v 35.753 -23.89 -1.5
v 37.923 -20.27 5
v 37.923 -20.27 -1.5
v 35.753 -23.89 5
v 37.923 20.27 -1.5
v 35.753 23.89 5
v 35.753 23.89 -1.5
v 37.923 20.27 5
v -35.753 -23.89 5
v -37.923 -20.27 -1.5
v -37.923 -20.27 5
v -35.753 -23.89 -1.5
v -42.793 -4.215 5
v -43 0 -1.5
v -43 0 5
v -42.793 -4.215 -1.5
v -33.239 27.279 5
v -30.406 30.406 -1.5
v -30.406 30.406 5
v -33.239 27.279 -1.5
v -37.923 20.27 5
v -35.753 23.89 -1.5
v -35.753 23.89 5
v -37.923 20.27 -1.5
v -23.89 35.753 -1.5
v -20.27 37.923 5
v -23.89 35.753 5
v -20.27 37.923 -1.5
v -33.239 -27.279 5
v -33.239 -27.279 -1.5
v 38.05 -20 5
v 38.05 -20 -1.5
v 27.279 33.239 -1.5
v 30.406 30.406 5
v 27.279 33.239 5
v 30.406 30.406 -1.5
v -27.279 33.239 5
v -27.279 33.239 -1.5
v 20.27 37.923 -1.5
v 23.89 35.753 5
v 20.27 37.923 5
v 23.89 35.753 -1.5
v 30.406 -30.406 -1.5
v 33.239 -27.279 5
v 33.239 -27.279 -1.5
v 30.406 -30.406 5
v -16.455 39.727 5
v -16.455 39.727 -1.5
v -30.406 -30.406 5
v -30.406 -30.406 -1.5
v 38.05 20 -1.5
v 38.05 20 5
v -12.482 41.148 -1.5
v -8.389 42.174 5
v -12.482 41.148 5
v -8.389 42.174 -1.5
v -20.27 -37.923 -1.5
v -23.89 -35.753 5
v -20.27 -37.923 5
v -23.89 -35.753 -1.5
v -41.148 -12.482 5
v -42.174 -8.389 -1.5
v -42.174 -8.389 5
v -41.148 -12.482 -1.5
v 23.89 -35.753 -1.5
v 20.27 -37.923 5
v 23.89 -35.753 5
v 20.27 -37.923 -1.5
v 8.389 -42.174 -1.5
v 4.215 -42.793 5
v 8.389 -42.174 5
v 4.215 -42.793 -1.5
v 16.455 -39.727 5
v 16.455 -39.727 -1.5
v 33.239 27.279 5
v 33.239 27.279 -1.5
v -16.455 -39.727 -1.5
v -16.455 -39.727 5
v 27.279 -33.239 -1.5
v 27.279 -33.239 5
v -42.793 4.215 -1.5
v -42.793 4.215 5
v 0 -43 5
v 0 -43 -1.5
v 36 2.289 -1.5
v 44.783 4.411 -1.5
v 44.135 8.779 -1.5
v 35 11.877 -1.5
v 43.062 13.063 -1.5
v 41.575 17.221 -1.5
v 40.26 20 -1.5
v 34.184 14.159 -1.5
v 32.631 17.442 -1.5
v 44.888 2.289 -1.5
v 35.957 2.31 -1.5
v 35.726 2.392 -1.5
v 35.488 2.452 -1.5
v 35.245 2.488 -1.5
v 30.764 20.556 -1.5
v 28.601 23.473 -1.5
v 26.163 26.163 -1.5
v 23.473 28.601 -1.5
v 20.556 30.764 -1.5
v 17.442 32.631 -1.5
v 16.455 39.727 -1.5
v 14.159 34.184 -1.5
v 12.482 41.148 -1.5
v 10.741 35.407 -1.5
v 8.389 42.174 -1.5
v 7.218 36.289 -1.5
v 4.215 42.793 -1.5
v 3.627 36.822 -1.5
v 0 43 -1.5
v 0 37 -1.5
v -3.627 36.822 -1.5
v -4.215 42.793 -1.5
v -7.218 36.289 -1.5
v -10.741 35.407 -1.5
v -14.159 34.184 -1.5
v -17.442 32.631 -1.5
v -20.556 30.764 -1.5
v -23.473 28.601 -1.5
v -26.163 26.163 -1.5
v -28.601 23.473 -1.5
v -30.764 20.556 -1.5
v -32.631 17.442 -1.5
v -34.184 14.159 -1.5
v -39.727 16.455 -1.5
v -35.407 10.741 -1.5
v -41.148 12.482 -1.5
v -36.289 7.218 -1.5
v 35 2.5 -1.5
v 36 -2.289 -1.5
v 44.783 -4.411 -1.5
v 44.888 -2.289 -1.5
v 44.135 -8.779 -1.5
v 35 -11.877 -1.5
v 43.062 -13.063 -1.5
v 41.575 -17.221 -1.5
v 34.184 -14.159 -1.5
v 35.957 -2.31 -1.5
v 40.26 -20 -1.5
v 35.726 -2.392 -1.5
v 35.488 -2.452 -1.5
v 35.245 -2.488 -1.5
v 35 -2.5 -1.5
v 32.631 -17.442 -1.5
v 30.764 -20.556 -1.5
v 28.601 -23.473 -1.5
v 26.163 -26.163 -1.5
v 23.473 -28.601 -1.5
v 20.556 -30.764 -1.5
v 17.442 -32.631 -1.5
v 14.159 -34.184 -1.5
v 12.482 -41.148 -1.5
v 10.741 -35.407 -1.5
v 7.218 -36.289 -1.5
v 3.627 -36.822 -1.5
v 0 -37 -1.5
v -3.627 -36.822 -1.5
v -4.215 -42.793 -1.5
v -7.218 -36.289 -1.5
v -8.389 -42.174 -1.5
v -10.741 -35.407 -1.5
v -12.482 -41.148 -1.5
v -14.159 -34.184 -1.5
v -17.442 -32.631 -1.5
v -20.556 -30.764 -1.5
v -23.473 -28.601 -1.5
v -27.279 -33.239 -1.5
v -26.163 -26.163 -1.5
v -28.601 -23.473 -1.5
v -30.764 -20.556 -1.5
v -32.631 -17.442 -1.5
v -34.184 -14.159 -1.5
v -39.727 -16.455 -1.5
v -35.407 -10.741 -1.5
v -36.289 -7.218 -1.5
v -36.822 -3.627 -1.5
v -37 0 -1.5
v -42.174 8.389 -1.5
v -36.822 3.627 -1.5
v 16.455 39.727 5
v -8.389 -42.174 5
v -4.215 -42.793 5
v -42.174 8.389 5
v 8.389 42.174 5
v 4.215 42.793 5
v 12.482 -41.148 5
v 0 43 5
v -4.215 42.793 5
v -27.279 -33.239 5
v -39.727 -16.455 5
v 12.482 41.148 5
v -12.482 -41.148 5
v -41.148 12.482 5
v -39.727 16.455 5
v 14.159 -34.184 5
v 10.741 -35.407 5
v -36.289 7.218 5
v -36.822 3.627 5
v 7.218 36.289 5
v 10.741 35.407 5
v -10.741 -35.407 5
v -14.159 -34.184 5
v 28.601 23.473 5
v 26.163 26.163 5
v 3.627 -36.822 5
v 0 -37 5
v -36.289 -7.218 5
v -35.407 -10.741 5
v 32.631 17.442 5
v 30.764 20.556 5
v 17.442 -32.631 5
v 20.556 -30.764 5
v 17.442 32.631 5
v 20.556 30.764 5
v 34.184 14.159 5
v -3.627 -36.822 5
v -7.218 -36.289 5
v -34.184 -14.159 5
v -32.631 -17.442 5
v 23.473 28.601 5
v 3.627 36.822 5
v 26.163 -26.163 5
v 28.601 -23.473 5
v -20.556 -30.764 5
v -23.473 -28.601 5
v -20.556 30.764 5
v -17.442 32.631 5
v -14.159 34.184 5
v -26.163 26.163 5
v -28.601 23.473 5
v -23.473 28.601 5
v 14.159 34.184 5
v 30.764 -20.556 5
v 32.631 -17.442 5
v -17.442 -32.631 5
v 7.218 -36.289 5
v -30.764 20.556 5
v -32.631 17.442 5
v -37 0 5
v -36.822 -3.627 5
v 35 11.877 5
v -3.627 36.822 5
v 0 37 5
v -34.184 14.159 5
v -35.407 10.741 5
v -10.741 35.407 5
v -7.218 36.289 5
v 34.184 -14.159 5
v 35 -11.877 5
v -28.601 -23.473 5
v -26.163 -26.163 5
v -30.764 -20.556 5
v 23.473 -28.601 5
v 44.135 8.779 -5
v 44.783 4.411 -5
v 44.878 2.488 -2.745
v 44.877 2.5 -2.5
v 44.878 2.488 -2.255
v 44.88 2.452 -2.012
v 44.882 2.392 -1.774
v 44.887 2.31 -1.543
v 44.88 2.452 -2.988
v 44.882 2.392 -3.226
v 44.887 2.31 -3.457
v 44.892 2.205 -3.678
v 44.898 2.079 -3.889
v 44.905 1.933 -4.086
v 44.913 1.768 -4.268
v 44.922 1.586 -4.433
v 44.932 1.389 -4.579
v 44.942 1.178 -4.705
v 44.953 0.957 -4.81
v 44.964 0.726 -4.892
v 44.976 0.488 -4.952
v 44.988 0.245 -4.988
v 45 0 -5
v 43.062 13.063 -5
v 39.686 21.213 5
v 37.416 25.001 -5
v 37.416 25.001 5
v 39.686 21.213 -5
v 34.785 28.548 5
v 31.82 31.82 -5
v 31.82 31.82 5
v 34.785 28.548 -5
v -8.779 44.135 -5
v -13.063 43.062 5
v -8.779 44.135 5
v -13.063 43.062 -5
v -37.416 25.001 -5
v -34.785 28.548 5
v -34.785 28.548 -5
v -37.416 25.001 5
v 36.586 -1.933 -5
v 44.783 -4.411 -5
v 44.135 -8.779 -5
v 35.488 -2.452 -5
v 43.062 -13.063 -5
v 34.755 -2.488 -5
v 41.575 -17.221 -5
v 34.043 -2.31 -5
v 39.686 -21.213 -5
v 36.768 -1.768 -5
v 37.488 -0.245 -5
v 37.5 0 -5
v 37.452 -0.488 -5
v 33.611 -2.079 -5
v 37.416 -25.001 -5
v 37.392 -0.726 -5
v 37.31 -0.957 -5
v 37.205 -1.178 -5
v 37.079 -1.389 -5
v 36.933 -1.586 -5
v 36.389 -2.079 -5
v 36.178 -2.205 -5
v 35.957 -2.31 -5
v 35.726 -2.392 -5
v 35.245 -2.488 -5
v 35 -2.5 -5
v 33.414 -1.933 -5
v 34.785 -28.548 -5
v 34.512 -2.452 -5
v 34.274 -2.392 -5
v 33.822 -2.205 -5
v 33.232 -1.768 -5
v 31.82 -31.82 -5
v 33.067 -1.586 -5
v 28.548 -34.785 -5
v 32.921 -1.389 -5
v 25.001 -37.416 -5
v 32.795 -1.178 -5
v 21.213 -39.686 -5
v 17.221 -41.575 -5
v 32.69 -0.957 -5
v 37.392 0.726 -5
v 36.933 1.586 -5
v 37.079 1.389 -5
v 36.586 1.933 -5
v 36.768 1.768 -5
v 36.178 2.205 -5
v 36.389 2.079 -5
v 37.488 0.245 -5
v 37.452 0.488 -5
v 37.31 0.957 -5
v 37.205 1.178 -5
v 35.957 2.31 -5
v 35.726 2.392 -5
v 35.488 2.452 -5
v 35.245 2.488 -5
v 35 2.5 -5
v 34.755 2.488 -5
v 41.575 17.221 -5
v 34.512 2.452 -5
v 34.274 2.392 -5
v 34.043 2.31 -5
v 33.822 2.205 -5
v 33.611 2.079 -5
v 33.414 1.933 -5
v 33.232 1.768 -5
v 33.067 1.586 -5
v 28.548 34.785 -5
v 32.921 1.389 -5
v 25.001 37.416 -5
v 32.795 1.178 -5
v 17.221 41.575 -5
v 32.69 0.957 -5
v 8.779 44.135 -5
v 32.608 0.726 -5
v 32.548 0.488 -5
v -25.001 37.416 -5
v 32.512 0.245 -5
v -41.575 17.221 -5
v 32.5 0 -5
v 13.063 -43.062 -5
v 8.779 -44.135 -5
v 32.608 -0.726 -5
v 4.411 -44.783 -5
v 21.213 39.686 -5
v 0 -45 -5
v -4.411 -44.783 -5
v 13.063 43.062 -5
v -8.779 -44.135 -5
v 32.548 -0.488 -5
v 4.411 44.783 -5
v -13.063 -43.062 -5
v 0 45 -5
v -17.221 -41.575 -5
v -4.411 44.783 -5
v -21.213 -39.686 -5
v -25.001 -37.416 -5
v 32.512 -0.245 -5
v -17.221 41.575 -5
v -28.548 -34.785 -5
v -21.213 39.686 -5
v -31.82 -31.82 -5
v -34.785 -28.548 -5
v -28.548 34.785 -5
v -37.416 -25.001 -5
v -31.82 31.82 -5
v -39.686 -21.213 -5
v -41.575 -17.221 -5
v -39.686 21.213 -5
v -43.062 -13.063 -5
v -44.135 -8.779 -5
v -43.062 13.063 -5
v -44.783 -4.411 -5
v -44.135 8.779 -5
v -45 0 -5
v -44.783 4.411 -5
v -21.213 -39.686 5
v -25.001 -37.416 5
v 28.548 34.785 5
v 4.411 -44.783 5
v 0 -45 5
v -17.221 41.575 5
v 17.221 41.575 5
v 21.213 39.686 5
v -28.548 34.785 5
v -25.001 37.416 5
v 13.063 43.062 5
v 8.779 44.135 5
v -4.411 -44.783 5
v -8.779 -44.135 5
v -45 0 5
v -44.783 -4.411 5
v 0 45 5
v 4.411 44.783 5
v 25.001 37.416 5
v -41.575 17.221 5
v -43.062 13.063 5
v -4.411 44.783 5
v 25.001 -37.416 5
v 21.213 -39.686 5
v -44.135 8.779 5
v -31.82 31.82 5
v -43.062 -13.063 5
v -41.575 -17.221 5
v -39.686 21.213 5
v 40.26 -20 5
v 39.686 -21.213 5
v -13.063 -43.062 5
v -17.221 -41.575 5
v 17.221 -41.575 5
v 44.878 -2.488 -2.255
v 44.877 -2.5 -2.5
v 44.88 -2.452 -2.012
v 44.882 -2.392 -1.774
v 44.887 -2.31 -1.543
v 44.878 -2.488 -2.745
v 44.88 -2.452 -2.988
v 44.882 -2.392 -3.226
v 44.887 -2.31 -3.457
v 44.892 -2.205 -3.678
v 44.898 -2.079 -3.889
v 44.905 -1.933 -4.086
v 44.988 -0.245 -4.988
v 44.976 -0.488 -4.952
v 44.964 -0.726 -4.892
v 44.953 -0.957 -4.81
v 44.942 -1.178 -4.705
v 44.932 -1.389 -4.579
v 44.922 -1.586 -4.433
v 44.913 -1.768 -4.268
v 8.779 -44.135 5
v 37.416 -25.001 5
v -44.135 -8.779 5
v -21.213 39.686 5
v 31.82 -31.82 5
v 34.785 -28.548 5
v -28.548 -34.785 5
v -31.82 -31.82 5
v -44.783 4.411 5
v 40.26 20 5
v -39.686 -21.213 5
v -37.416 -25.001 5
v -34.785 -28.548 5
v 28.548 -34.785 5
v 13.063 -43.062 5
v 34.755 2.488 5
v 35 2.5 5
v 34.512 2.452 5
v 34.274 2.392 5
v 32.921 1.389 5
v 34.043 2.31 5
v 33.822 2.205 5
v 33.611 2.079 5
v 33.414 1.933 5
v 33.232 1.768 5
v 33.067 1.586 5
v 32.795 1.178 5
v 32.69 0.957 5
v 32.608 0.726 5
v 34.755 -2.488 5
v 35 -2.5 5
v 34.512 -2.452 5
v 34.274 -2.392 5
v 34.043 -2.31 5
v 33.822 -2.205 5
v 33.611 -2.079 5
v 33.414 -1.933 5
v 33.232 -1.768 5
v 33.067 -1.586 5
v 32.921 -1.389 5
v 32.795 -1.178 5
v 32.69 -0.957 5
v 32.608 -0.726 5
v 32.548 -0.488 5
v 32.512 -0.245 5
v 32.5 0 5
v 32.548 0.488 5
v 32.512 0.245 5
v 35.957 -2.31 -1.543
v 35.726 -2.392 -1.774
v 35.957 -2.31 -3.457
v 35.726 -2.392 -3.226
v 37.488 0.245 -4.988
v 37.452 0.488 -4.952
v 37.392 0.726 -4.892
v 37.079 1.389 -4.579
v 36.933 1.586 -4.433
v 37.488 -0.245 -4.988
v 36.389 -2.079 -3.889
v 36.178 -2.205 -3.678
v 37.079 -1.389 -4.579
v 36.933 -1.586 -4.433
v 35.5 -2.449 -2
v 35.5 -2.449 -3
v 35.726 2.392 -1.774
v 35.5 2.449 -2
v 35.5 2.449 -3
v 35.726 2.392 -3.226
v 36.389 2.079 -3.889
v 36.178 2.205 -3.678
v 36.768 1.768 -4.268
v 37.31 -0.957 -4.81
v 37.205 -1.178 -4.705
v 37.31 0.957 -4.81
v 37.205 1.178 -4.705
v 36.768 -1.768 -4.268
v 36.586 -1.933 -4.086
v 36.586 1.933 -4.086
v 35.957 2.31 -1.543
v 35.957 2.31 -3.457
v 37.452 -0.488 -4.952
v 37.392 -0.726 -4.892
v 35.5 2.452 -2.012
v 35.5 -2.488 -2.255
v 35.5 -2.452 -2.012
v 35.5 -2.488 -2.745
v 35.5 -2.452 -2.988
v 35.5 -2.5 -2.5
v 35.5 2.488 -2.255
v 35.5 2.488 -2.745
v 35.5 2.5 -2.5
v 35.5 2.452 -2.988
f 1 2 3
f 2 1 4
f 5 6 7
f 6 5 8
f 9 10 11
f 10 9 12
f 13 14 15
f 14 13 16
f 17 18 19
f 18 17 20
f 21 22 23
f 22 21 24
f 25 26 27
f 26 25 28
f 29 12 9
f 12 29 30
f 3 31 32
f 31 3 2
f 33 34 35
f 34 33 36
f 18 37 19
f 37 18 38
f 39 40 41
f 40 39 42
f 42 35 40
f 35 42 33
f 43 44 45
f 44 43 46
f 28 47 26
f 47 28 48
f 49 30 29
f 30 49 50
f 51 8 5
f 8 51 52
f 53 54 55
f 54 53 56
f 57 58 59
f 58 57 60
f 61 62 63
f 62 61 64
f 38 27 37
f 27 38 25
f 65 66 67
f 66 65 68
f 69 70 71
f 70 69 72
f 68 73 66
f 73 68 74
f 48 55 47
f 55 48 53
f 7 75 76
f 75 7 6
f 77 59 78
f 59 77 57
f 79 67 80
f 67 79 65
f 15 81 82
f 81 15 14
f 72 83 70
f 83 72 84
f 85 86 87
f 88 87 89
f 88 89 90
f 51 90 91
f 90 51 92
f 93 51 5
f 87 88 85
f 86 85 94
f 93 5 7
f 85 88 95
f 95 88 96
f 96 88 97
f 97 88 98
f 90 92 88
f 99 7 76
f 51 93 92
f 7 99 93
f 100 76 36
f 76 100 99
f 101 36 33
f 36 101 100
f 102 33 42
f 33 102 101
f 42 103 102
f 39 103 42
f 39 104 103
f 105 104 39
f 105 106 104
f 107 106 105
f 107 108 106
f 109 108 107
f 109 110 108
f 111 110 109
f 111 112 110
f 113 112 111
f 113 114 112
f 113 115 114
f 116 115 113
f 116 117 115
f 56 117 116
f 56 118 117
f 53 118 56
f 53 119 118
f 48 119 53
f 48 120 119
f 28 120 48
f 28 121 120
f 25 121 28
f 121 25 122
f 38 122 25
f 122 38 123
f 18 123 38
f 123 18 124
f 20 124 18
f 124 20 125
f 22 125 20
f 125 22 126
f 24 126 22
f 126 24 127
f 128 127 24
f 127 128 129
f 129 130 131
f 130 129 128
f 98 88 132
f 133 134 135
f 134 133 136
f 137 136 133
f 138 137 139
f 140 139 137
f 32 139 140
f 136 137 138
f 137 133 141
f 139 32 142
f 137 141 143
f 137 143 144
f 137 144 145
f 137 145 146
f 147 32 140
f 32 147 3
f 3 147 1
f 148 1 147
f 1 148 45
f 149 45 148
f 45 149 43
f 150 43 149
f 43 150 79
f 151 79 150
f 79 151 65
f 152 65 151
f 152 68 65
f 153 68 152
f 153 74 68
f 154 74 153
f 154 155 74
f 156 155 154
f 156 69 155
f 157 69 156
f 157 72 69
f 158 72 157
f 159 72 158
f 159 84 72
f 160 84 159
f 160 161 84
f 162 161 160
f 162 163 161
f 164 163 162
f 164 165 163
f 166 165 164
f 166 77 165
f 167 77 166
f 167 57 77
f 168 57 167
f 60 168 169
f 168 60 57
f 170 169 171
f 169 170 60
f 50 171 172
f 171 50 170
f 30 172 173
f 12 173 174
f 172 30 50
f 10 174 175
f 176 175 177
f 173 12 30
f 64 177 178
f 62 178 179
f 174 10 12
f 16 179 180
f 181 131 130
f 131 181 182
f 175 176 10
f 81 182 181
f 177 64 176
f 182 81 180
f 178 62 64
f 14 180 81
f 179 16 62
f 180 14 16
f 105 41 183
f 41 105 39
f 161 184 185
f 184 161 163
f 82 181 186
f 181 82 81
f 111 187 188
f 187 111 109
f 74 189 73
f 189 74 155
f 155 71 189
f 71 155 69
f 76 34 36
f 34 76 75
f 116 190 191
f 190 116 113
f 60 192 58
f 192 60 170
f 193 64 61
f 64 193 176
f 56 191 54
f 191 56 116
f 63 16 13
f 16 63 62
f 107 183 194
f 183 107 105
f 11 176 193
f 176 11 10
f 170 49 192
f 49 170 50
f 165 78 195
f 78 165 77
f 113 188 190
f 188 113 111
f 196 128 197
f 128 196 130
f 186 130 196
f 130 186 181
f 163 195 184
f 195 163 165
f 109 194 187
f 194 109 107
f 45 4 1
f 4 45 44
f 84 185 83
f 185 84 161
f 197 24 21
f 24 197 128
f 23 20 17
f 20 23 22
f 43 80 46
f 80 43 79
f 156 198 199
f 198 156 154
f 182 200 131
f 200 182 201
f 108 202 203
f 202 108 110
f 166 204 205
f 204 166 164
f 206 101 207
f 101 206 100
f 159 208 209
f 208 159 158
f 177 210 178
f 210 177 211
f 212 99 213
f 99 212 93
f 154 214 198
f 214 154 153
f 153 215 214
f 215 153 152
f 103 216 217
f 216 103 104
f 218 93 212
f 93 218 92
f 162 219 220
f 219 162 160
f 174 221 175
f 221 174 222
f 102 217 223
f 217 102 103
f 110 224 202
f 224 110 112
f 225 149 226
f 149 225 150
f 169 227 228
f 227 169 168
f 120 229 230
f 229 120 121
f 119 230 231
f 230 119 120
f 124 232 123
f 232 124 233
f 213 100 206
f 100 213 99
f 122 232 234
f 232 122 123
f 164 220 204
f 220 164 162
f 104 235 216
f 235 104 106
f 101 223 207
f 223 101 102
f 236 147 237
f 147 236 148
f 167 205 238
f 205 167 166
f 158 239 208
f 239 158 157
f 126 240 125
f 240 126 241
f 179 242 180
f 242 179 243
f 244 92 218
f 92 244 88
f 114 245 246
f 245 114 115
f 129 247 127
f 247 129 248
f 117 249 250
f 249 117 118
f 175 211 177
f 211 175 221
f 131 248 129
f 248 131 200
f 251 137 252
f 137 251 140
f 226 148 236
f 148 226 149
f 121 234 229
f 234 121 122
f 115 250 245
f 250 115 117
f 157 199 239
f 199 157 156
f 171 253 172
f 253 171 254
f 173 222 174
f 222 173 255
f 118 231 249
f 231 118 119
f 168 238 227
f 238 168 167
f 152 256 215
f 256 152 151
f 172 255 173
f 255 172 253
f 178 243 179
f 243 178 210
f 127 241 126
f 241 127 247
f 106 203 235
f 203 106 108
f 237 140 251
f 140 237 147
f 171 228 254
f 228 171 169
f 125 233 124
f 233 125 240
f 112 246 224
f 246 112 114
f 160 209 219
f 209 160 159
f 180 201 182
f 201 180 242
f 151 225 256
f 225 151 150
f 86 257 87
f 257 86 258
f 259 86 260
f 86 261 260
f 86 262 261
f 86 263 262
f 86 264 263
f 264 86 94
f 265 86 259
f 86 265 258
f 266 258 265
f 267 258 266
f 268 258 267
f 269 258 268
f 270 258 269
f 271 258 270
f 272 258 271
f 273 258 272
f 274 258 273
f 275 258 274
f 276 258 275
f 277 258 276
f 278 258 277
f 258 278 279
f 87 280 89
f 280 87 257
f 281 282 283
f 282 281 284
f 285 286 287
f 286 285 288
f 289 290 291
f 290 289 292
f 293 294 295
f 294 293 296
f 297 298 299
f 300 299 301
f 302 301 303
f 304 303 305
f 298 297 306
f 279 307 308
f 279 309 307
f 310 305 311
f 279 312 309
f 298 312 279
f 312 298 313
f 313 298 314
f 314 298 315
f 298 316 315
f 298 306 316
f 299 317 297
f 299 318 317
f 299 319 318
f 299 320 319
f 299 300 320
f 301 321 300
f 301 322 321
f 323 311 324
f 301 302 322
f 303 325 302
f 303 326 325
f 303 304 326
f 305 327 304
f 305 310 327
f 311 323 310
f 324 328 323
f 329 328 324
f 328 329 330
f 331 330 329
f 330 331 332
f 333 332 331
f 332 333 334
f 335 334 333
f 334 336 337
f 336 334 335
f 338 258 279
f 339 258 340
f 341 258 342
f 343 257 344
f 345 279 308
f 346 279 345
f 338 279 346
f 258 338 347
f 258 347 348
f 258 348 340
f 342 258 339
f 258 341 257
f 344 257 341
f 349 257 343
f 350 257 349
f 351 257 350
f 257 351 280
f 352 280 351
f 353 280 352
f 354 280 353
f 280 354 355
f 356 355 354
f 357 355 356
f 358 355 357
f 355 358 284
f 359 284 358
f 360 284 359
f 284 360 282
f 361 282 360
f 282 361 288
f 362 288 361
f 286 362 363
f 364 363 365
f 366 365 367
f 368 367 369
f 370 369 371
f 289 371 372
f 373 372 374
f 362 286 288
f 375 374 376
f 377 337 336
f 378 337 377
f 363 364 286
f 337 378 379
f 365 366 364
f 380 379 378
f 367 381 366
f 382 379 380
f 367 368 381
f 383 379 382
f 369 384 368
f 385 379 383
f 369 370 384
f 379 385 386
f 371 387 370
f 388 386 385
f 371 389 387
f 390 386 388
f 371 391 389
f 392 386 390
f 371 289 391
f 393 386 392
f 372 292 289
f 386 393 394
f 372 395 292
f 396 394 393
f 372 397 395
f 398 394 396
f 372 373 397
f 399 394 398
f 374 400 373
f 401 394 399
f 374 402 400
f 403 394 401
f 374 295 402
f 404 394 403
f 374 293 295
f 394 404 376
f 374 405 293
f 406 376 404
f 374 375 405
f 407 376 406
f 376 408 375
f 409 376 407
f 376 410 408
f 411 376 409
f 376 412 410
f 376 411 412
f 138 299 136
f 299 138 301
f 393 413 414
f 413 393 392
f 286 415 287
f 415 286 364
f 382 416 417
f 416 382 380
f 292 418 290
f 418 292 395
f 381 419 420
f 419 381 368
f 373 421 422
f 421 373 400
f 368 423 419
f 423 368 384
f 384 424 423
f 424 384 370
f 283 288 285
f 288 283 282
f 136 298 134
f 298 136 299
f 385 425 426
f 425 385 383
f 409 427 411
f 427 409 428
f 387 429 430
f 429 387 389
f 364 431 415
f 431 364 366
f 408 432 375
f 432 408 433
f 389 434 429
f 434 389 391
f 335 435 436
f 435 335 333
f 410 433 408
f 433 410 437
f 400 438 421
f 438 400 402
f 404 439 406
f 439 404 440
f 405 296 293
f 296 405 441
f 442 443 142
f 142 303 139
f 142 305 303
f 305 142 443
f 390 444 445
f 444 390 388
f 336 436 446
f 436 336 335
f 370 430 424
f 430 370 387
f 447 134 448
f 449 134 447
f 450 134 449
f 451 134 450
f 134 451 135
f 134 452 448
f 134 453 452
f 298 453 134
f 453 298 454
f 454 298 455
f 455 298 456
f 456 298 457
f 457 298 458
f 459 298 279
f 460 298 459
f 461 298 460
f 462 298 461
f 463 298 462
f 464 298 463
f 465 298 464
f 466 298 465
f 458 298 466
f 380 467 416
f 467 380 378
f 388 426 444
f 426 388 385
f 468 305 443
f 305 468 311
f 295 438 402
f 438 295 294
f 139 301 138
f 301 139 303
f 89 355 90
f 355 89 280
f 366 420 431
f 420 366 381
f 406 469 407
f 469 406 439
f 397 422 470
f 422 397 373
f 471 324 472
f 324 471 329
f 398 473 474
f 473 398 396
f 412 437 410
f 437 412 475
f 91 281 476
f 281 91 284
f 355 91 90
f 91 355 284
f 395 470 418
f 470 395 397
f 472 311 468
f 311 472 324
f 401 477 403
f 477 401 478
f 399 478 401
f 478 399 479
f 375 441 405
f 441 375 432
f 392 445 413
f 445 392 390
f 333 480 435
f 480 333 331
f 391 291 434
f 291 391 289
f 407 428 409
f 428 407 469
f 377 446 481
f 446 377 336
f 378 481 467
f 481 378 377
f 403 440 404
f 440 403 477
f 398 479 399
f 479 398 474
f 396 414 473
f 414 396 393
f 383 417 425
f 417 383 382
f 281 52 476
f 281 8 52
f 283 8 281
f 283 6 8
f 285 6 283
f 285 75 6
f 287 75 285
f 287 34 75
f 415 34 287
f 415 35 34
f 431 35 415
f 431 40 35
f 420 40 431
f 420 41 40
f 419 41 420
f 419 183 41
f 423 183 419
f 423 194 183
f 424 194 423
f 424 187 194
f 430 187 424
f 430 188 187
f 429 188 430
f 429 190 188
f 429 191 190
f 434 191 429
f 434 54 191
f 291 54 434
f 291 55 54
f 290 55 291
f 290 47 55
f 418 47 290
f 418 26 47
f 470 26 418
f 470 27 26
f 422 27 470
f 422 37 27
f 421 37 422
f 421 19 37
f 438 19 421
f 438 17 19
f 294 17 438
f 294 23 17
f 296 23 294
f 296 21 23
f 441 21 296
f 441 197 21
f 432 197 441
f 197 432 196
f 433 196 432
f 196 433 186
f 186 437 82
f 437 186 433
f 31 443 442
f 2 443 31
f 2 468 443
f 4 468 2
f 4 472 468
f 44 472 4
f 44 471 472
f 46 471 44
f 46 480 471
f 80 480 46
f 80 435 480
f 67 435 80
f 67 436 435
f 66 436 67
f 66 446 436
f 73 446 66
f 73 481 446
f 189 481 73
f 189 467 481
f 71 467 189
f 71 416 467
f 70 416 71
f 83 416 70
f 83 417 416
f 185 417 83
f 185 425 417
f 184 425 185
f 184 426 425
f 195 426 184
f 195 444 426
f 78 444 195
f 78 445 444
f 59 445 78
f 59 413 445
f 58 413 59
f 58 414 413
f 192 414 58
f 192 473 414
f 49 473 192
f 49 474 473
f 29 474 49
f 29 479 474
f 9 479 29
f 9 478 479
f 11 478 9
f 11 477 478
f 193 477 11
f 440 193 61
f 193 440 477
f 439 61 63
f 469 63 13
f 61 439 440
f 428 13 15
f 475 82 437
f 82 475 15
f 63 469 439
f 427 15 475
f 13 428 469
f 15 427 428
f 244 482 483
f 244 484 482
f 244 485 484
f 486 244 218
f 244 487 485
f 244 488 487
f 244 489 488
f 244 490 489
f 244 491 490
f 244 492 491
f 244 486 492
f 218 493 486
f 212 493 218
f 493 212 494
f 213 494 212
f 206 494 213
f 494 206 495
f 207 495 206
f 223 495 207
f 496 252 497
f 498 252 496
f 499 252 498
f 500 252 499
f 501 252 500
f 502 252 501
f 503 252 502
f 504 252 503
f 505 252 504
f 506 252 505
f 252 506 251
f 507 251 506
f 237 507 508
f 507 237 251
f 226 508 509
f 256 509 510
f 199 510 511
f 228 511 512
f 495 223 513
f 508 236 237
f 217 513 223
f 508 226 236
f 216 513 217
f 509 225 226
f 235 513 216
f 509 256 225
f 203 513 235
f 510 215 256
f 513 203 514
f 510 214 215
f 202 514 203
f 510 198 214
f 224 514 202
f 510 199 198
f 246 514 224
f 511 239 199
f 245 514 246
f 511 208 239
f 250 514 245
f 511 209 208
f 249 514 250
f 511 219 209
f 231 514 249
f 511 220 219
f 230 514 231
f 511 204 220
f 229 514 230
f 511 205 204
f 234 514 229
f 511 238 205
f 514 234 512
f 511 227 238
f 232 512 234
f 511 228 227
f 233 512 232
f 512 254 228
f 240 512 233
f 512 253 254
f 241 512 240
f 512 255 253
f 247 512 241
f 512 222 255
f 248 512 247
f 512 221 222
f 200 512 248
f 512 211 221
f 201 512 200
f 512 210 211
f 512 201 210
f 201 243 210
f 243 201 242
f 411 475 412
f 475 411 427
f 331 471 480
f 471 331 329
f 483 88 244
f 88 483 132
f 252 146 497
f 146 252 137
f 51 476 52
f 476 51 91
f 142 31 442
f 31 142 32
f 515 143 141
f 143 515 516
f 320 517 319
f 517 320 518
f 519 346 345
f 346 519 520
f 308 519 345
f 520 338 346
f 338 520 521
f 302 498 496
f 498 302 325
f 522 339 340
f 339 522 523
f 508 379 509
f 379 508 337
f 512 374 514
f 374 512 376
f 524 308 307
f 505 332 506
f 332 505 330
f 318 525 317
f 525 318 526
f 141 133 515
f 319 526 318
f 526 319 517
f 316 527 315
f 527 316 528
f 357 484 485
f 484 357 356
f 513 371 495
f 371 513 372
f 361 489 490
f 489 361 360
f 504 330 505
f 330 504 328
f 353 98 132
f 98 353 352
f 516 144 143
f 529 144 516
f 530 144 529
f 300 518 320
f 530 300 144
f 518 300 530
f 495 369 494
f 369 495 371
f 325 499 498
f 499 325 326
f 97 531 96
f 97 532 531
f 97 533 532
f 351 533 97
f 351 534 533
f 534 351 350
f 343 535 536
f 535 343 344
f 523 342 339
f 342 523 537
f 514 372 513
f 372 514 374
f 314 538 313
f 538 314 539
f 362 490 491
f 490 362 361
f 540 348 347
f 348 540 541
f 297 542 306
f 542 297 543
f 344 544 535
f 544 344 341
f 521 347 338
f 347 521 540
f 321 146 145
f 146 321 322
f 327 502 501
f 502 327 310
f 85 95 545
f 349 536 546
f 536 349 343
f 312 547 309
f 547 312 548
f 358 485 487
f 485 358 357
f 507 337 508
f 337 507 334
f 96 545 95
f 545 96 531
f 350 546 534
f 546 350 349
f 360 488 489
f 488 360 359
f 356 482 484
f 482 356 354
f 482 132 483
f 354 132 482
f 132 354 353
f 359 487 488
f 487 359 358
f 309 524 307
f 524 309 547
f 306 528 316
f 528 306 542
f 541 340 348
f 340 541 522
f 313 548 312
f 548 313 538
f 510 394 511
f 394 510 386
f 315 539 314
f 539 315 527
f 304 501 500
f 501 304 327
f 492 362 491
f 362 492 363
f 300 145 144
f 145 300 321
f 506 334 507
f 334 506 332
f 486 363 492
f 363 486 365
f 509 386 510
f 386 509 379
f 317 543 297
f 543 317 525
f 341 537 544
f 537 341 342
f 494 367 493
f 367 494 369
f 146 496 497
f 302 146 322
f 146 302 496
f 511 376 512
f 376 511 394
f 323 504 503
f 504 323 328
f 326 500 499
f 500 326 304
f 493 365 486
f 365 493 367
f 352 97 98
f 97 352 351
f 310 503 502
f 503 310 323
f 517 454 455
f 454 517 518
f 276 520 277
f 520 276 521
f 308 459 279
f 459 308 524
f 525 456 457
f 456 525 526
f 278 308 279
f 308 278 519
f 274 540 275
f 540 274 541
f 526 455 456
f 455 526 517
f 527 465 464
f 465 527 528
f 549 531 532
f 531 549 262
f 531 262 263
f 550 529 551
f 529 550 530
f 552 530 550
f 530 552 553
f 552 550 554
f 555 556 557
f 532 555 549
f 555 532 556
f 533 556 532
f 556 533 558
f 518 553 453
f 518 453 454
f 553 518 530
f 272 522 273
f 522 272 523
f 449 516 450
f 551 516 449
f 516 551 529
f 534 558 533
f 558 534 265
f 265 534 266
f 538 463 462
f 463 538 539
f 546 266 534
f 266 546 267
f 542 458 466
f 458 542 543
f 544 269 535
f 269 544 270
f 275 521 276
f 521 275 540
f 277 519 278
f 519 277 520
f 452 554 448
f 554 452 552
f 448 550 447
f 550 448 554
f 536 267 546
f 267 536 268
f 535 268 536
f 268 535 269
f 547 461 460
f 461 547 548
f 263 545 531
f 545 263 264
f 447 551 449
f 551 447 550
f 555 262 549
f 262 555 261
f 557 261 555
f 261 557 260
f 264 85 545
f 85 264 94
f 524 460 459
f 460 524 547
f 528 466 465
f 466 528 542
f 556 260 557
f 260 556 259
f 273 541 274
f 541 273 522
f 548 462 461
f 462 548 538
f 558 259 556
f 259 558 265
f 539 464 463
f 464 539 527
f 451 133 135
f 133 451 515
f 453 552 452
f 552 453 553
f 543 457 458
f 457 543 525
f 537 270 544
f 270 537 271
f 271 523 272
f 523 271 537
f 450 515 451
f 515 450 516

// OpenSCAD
// file: Speaker_Walls.scad
// Bluetooth speaker
$fn = 64;

//walls(50);

module walls(thickness) {
 difference() {
  cylinder(d = 80+thickness/2, h = 150, center=true);
  color("red")
  cylinder(d = 80-thickness/2, h = 151, center=true);
}
}
// main file
include <Speaker_Walls.scad>;

bottom_kit();


module bottom_kit(){
    difference() {
        bottom();
        holes();
    }
}

module holes() {
    translate([90/2, 0, 25/2-1.5])
        cube([20, 40, 25], center = true);
    
    //vertical_hole
    translate([90/2-20/2, 0, 0])
        cylinder(d=5, h=30, center=true);
    
    //harizont_hole
    translate([90/2-20/2+8, 0, -5/2])
        rotate([0,90,0])
            cylinder(d = 5, h = 15, center = true);
}

module bottom() {
 difference() {
   cylinder(d = 90, h = 10, center=true);
  translate([0, 0, 150/2+10/4-4])
   walls(thickness=12);
 }
}
